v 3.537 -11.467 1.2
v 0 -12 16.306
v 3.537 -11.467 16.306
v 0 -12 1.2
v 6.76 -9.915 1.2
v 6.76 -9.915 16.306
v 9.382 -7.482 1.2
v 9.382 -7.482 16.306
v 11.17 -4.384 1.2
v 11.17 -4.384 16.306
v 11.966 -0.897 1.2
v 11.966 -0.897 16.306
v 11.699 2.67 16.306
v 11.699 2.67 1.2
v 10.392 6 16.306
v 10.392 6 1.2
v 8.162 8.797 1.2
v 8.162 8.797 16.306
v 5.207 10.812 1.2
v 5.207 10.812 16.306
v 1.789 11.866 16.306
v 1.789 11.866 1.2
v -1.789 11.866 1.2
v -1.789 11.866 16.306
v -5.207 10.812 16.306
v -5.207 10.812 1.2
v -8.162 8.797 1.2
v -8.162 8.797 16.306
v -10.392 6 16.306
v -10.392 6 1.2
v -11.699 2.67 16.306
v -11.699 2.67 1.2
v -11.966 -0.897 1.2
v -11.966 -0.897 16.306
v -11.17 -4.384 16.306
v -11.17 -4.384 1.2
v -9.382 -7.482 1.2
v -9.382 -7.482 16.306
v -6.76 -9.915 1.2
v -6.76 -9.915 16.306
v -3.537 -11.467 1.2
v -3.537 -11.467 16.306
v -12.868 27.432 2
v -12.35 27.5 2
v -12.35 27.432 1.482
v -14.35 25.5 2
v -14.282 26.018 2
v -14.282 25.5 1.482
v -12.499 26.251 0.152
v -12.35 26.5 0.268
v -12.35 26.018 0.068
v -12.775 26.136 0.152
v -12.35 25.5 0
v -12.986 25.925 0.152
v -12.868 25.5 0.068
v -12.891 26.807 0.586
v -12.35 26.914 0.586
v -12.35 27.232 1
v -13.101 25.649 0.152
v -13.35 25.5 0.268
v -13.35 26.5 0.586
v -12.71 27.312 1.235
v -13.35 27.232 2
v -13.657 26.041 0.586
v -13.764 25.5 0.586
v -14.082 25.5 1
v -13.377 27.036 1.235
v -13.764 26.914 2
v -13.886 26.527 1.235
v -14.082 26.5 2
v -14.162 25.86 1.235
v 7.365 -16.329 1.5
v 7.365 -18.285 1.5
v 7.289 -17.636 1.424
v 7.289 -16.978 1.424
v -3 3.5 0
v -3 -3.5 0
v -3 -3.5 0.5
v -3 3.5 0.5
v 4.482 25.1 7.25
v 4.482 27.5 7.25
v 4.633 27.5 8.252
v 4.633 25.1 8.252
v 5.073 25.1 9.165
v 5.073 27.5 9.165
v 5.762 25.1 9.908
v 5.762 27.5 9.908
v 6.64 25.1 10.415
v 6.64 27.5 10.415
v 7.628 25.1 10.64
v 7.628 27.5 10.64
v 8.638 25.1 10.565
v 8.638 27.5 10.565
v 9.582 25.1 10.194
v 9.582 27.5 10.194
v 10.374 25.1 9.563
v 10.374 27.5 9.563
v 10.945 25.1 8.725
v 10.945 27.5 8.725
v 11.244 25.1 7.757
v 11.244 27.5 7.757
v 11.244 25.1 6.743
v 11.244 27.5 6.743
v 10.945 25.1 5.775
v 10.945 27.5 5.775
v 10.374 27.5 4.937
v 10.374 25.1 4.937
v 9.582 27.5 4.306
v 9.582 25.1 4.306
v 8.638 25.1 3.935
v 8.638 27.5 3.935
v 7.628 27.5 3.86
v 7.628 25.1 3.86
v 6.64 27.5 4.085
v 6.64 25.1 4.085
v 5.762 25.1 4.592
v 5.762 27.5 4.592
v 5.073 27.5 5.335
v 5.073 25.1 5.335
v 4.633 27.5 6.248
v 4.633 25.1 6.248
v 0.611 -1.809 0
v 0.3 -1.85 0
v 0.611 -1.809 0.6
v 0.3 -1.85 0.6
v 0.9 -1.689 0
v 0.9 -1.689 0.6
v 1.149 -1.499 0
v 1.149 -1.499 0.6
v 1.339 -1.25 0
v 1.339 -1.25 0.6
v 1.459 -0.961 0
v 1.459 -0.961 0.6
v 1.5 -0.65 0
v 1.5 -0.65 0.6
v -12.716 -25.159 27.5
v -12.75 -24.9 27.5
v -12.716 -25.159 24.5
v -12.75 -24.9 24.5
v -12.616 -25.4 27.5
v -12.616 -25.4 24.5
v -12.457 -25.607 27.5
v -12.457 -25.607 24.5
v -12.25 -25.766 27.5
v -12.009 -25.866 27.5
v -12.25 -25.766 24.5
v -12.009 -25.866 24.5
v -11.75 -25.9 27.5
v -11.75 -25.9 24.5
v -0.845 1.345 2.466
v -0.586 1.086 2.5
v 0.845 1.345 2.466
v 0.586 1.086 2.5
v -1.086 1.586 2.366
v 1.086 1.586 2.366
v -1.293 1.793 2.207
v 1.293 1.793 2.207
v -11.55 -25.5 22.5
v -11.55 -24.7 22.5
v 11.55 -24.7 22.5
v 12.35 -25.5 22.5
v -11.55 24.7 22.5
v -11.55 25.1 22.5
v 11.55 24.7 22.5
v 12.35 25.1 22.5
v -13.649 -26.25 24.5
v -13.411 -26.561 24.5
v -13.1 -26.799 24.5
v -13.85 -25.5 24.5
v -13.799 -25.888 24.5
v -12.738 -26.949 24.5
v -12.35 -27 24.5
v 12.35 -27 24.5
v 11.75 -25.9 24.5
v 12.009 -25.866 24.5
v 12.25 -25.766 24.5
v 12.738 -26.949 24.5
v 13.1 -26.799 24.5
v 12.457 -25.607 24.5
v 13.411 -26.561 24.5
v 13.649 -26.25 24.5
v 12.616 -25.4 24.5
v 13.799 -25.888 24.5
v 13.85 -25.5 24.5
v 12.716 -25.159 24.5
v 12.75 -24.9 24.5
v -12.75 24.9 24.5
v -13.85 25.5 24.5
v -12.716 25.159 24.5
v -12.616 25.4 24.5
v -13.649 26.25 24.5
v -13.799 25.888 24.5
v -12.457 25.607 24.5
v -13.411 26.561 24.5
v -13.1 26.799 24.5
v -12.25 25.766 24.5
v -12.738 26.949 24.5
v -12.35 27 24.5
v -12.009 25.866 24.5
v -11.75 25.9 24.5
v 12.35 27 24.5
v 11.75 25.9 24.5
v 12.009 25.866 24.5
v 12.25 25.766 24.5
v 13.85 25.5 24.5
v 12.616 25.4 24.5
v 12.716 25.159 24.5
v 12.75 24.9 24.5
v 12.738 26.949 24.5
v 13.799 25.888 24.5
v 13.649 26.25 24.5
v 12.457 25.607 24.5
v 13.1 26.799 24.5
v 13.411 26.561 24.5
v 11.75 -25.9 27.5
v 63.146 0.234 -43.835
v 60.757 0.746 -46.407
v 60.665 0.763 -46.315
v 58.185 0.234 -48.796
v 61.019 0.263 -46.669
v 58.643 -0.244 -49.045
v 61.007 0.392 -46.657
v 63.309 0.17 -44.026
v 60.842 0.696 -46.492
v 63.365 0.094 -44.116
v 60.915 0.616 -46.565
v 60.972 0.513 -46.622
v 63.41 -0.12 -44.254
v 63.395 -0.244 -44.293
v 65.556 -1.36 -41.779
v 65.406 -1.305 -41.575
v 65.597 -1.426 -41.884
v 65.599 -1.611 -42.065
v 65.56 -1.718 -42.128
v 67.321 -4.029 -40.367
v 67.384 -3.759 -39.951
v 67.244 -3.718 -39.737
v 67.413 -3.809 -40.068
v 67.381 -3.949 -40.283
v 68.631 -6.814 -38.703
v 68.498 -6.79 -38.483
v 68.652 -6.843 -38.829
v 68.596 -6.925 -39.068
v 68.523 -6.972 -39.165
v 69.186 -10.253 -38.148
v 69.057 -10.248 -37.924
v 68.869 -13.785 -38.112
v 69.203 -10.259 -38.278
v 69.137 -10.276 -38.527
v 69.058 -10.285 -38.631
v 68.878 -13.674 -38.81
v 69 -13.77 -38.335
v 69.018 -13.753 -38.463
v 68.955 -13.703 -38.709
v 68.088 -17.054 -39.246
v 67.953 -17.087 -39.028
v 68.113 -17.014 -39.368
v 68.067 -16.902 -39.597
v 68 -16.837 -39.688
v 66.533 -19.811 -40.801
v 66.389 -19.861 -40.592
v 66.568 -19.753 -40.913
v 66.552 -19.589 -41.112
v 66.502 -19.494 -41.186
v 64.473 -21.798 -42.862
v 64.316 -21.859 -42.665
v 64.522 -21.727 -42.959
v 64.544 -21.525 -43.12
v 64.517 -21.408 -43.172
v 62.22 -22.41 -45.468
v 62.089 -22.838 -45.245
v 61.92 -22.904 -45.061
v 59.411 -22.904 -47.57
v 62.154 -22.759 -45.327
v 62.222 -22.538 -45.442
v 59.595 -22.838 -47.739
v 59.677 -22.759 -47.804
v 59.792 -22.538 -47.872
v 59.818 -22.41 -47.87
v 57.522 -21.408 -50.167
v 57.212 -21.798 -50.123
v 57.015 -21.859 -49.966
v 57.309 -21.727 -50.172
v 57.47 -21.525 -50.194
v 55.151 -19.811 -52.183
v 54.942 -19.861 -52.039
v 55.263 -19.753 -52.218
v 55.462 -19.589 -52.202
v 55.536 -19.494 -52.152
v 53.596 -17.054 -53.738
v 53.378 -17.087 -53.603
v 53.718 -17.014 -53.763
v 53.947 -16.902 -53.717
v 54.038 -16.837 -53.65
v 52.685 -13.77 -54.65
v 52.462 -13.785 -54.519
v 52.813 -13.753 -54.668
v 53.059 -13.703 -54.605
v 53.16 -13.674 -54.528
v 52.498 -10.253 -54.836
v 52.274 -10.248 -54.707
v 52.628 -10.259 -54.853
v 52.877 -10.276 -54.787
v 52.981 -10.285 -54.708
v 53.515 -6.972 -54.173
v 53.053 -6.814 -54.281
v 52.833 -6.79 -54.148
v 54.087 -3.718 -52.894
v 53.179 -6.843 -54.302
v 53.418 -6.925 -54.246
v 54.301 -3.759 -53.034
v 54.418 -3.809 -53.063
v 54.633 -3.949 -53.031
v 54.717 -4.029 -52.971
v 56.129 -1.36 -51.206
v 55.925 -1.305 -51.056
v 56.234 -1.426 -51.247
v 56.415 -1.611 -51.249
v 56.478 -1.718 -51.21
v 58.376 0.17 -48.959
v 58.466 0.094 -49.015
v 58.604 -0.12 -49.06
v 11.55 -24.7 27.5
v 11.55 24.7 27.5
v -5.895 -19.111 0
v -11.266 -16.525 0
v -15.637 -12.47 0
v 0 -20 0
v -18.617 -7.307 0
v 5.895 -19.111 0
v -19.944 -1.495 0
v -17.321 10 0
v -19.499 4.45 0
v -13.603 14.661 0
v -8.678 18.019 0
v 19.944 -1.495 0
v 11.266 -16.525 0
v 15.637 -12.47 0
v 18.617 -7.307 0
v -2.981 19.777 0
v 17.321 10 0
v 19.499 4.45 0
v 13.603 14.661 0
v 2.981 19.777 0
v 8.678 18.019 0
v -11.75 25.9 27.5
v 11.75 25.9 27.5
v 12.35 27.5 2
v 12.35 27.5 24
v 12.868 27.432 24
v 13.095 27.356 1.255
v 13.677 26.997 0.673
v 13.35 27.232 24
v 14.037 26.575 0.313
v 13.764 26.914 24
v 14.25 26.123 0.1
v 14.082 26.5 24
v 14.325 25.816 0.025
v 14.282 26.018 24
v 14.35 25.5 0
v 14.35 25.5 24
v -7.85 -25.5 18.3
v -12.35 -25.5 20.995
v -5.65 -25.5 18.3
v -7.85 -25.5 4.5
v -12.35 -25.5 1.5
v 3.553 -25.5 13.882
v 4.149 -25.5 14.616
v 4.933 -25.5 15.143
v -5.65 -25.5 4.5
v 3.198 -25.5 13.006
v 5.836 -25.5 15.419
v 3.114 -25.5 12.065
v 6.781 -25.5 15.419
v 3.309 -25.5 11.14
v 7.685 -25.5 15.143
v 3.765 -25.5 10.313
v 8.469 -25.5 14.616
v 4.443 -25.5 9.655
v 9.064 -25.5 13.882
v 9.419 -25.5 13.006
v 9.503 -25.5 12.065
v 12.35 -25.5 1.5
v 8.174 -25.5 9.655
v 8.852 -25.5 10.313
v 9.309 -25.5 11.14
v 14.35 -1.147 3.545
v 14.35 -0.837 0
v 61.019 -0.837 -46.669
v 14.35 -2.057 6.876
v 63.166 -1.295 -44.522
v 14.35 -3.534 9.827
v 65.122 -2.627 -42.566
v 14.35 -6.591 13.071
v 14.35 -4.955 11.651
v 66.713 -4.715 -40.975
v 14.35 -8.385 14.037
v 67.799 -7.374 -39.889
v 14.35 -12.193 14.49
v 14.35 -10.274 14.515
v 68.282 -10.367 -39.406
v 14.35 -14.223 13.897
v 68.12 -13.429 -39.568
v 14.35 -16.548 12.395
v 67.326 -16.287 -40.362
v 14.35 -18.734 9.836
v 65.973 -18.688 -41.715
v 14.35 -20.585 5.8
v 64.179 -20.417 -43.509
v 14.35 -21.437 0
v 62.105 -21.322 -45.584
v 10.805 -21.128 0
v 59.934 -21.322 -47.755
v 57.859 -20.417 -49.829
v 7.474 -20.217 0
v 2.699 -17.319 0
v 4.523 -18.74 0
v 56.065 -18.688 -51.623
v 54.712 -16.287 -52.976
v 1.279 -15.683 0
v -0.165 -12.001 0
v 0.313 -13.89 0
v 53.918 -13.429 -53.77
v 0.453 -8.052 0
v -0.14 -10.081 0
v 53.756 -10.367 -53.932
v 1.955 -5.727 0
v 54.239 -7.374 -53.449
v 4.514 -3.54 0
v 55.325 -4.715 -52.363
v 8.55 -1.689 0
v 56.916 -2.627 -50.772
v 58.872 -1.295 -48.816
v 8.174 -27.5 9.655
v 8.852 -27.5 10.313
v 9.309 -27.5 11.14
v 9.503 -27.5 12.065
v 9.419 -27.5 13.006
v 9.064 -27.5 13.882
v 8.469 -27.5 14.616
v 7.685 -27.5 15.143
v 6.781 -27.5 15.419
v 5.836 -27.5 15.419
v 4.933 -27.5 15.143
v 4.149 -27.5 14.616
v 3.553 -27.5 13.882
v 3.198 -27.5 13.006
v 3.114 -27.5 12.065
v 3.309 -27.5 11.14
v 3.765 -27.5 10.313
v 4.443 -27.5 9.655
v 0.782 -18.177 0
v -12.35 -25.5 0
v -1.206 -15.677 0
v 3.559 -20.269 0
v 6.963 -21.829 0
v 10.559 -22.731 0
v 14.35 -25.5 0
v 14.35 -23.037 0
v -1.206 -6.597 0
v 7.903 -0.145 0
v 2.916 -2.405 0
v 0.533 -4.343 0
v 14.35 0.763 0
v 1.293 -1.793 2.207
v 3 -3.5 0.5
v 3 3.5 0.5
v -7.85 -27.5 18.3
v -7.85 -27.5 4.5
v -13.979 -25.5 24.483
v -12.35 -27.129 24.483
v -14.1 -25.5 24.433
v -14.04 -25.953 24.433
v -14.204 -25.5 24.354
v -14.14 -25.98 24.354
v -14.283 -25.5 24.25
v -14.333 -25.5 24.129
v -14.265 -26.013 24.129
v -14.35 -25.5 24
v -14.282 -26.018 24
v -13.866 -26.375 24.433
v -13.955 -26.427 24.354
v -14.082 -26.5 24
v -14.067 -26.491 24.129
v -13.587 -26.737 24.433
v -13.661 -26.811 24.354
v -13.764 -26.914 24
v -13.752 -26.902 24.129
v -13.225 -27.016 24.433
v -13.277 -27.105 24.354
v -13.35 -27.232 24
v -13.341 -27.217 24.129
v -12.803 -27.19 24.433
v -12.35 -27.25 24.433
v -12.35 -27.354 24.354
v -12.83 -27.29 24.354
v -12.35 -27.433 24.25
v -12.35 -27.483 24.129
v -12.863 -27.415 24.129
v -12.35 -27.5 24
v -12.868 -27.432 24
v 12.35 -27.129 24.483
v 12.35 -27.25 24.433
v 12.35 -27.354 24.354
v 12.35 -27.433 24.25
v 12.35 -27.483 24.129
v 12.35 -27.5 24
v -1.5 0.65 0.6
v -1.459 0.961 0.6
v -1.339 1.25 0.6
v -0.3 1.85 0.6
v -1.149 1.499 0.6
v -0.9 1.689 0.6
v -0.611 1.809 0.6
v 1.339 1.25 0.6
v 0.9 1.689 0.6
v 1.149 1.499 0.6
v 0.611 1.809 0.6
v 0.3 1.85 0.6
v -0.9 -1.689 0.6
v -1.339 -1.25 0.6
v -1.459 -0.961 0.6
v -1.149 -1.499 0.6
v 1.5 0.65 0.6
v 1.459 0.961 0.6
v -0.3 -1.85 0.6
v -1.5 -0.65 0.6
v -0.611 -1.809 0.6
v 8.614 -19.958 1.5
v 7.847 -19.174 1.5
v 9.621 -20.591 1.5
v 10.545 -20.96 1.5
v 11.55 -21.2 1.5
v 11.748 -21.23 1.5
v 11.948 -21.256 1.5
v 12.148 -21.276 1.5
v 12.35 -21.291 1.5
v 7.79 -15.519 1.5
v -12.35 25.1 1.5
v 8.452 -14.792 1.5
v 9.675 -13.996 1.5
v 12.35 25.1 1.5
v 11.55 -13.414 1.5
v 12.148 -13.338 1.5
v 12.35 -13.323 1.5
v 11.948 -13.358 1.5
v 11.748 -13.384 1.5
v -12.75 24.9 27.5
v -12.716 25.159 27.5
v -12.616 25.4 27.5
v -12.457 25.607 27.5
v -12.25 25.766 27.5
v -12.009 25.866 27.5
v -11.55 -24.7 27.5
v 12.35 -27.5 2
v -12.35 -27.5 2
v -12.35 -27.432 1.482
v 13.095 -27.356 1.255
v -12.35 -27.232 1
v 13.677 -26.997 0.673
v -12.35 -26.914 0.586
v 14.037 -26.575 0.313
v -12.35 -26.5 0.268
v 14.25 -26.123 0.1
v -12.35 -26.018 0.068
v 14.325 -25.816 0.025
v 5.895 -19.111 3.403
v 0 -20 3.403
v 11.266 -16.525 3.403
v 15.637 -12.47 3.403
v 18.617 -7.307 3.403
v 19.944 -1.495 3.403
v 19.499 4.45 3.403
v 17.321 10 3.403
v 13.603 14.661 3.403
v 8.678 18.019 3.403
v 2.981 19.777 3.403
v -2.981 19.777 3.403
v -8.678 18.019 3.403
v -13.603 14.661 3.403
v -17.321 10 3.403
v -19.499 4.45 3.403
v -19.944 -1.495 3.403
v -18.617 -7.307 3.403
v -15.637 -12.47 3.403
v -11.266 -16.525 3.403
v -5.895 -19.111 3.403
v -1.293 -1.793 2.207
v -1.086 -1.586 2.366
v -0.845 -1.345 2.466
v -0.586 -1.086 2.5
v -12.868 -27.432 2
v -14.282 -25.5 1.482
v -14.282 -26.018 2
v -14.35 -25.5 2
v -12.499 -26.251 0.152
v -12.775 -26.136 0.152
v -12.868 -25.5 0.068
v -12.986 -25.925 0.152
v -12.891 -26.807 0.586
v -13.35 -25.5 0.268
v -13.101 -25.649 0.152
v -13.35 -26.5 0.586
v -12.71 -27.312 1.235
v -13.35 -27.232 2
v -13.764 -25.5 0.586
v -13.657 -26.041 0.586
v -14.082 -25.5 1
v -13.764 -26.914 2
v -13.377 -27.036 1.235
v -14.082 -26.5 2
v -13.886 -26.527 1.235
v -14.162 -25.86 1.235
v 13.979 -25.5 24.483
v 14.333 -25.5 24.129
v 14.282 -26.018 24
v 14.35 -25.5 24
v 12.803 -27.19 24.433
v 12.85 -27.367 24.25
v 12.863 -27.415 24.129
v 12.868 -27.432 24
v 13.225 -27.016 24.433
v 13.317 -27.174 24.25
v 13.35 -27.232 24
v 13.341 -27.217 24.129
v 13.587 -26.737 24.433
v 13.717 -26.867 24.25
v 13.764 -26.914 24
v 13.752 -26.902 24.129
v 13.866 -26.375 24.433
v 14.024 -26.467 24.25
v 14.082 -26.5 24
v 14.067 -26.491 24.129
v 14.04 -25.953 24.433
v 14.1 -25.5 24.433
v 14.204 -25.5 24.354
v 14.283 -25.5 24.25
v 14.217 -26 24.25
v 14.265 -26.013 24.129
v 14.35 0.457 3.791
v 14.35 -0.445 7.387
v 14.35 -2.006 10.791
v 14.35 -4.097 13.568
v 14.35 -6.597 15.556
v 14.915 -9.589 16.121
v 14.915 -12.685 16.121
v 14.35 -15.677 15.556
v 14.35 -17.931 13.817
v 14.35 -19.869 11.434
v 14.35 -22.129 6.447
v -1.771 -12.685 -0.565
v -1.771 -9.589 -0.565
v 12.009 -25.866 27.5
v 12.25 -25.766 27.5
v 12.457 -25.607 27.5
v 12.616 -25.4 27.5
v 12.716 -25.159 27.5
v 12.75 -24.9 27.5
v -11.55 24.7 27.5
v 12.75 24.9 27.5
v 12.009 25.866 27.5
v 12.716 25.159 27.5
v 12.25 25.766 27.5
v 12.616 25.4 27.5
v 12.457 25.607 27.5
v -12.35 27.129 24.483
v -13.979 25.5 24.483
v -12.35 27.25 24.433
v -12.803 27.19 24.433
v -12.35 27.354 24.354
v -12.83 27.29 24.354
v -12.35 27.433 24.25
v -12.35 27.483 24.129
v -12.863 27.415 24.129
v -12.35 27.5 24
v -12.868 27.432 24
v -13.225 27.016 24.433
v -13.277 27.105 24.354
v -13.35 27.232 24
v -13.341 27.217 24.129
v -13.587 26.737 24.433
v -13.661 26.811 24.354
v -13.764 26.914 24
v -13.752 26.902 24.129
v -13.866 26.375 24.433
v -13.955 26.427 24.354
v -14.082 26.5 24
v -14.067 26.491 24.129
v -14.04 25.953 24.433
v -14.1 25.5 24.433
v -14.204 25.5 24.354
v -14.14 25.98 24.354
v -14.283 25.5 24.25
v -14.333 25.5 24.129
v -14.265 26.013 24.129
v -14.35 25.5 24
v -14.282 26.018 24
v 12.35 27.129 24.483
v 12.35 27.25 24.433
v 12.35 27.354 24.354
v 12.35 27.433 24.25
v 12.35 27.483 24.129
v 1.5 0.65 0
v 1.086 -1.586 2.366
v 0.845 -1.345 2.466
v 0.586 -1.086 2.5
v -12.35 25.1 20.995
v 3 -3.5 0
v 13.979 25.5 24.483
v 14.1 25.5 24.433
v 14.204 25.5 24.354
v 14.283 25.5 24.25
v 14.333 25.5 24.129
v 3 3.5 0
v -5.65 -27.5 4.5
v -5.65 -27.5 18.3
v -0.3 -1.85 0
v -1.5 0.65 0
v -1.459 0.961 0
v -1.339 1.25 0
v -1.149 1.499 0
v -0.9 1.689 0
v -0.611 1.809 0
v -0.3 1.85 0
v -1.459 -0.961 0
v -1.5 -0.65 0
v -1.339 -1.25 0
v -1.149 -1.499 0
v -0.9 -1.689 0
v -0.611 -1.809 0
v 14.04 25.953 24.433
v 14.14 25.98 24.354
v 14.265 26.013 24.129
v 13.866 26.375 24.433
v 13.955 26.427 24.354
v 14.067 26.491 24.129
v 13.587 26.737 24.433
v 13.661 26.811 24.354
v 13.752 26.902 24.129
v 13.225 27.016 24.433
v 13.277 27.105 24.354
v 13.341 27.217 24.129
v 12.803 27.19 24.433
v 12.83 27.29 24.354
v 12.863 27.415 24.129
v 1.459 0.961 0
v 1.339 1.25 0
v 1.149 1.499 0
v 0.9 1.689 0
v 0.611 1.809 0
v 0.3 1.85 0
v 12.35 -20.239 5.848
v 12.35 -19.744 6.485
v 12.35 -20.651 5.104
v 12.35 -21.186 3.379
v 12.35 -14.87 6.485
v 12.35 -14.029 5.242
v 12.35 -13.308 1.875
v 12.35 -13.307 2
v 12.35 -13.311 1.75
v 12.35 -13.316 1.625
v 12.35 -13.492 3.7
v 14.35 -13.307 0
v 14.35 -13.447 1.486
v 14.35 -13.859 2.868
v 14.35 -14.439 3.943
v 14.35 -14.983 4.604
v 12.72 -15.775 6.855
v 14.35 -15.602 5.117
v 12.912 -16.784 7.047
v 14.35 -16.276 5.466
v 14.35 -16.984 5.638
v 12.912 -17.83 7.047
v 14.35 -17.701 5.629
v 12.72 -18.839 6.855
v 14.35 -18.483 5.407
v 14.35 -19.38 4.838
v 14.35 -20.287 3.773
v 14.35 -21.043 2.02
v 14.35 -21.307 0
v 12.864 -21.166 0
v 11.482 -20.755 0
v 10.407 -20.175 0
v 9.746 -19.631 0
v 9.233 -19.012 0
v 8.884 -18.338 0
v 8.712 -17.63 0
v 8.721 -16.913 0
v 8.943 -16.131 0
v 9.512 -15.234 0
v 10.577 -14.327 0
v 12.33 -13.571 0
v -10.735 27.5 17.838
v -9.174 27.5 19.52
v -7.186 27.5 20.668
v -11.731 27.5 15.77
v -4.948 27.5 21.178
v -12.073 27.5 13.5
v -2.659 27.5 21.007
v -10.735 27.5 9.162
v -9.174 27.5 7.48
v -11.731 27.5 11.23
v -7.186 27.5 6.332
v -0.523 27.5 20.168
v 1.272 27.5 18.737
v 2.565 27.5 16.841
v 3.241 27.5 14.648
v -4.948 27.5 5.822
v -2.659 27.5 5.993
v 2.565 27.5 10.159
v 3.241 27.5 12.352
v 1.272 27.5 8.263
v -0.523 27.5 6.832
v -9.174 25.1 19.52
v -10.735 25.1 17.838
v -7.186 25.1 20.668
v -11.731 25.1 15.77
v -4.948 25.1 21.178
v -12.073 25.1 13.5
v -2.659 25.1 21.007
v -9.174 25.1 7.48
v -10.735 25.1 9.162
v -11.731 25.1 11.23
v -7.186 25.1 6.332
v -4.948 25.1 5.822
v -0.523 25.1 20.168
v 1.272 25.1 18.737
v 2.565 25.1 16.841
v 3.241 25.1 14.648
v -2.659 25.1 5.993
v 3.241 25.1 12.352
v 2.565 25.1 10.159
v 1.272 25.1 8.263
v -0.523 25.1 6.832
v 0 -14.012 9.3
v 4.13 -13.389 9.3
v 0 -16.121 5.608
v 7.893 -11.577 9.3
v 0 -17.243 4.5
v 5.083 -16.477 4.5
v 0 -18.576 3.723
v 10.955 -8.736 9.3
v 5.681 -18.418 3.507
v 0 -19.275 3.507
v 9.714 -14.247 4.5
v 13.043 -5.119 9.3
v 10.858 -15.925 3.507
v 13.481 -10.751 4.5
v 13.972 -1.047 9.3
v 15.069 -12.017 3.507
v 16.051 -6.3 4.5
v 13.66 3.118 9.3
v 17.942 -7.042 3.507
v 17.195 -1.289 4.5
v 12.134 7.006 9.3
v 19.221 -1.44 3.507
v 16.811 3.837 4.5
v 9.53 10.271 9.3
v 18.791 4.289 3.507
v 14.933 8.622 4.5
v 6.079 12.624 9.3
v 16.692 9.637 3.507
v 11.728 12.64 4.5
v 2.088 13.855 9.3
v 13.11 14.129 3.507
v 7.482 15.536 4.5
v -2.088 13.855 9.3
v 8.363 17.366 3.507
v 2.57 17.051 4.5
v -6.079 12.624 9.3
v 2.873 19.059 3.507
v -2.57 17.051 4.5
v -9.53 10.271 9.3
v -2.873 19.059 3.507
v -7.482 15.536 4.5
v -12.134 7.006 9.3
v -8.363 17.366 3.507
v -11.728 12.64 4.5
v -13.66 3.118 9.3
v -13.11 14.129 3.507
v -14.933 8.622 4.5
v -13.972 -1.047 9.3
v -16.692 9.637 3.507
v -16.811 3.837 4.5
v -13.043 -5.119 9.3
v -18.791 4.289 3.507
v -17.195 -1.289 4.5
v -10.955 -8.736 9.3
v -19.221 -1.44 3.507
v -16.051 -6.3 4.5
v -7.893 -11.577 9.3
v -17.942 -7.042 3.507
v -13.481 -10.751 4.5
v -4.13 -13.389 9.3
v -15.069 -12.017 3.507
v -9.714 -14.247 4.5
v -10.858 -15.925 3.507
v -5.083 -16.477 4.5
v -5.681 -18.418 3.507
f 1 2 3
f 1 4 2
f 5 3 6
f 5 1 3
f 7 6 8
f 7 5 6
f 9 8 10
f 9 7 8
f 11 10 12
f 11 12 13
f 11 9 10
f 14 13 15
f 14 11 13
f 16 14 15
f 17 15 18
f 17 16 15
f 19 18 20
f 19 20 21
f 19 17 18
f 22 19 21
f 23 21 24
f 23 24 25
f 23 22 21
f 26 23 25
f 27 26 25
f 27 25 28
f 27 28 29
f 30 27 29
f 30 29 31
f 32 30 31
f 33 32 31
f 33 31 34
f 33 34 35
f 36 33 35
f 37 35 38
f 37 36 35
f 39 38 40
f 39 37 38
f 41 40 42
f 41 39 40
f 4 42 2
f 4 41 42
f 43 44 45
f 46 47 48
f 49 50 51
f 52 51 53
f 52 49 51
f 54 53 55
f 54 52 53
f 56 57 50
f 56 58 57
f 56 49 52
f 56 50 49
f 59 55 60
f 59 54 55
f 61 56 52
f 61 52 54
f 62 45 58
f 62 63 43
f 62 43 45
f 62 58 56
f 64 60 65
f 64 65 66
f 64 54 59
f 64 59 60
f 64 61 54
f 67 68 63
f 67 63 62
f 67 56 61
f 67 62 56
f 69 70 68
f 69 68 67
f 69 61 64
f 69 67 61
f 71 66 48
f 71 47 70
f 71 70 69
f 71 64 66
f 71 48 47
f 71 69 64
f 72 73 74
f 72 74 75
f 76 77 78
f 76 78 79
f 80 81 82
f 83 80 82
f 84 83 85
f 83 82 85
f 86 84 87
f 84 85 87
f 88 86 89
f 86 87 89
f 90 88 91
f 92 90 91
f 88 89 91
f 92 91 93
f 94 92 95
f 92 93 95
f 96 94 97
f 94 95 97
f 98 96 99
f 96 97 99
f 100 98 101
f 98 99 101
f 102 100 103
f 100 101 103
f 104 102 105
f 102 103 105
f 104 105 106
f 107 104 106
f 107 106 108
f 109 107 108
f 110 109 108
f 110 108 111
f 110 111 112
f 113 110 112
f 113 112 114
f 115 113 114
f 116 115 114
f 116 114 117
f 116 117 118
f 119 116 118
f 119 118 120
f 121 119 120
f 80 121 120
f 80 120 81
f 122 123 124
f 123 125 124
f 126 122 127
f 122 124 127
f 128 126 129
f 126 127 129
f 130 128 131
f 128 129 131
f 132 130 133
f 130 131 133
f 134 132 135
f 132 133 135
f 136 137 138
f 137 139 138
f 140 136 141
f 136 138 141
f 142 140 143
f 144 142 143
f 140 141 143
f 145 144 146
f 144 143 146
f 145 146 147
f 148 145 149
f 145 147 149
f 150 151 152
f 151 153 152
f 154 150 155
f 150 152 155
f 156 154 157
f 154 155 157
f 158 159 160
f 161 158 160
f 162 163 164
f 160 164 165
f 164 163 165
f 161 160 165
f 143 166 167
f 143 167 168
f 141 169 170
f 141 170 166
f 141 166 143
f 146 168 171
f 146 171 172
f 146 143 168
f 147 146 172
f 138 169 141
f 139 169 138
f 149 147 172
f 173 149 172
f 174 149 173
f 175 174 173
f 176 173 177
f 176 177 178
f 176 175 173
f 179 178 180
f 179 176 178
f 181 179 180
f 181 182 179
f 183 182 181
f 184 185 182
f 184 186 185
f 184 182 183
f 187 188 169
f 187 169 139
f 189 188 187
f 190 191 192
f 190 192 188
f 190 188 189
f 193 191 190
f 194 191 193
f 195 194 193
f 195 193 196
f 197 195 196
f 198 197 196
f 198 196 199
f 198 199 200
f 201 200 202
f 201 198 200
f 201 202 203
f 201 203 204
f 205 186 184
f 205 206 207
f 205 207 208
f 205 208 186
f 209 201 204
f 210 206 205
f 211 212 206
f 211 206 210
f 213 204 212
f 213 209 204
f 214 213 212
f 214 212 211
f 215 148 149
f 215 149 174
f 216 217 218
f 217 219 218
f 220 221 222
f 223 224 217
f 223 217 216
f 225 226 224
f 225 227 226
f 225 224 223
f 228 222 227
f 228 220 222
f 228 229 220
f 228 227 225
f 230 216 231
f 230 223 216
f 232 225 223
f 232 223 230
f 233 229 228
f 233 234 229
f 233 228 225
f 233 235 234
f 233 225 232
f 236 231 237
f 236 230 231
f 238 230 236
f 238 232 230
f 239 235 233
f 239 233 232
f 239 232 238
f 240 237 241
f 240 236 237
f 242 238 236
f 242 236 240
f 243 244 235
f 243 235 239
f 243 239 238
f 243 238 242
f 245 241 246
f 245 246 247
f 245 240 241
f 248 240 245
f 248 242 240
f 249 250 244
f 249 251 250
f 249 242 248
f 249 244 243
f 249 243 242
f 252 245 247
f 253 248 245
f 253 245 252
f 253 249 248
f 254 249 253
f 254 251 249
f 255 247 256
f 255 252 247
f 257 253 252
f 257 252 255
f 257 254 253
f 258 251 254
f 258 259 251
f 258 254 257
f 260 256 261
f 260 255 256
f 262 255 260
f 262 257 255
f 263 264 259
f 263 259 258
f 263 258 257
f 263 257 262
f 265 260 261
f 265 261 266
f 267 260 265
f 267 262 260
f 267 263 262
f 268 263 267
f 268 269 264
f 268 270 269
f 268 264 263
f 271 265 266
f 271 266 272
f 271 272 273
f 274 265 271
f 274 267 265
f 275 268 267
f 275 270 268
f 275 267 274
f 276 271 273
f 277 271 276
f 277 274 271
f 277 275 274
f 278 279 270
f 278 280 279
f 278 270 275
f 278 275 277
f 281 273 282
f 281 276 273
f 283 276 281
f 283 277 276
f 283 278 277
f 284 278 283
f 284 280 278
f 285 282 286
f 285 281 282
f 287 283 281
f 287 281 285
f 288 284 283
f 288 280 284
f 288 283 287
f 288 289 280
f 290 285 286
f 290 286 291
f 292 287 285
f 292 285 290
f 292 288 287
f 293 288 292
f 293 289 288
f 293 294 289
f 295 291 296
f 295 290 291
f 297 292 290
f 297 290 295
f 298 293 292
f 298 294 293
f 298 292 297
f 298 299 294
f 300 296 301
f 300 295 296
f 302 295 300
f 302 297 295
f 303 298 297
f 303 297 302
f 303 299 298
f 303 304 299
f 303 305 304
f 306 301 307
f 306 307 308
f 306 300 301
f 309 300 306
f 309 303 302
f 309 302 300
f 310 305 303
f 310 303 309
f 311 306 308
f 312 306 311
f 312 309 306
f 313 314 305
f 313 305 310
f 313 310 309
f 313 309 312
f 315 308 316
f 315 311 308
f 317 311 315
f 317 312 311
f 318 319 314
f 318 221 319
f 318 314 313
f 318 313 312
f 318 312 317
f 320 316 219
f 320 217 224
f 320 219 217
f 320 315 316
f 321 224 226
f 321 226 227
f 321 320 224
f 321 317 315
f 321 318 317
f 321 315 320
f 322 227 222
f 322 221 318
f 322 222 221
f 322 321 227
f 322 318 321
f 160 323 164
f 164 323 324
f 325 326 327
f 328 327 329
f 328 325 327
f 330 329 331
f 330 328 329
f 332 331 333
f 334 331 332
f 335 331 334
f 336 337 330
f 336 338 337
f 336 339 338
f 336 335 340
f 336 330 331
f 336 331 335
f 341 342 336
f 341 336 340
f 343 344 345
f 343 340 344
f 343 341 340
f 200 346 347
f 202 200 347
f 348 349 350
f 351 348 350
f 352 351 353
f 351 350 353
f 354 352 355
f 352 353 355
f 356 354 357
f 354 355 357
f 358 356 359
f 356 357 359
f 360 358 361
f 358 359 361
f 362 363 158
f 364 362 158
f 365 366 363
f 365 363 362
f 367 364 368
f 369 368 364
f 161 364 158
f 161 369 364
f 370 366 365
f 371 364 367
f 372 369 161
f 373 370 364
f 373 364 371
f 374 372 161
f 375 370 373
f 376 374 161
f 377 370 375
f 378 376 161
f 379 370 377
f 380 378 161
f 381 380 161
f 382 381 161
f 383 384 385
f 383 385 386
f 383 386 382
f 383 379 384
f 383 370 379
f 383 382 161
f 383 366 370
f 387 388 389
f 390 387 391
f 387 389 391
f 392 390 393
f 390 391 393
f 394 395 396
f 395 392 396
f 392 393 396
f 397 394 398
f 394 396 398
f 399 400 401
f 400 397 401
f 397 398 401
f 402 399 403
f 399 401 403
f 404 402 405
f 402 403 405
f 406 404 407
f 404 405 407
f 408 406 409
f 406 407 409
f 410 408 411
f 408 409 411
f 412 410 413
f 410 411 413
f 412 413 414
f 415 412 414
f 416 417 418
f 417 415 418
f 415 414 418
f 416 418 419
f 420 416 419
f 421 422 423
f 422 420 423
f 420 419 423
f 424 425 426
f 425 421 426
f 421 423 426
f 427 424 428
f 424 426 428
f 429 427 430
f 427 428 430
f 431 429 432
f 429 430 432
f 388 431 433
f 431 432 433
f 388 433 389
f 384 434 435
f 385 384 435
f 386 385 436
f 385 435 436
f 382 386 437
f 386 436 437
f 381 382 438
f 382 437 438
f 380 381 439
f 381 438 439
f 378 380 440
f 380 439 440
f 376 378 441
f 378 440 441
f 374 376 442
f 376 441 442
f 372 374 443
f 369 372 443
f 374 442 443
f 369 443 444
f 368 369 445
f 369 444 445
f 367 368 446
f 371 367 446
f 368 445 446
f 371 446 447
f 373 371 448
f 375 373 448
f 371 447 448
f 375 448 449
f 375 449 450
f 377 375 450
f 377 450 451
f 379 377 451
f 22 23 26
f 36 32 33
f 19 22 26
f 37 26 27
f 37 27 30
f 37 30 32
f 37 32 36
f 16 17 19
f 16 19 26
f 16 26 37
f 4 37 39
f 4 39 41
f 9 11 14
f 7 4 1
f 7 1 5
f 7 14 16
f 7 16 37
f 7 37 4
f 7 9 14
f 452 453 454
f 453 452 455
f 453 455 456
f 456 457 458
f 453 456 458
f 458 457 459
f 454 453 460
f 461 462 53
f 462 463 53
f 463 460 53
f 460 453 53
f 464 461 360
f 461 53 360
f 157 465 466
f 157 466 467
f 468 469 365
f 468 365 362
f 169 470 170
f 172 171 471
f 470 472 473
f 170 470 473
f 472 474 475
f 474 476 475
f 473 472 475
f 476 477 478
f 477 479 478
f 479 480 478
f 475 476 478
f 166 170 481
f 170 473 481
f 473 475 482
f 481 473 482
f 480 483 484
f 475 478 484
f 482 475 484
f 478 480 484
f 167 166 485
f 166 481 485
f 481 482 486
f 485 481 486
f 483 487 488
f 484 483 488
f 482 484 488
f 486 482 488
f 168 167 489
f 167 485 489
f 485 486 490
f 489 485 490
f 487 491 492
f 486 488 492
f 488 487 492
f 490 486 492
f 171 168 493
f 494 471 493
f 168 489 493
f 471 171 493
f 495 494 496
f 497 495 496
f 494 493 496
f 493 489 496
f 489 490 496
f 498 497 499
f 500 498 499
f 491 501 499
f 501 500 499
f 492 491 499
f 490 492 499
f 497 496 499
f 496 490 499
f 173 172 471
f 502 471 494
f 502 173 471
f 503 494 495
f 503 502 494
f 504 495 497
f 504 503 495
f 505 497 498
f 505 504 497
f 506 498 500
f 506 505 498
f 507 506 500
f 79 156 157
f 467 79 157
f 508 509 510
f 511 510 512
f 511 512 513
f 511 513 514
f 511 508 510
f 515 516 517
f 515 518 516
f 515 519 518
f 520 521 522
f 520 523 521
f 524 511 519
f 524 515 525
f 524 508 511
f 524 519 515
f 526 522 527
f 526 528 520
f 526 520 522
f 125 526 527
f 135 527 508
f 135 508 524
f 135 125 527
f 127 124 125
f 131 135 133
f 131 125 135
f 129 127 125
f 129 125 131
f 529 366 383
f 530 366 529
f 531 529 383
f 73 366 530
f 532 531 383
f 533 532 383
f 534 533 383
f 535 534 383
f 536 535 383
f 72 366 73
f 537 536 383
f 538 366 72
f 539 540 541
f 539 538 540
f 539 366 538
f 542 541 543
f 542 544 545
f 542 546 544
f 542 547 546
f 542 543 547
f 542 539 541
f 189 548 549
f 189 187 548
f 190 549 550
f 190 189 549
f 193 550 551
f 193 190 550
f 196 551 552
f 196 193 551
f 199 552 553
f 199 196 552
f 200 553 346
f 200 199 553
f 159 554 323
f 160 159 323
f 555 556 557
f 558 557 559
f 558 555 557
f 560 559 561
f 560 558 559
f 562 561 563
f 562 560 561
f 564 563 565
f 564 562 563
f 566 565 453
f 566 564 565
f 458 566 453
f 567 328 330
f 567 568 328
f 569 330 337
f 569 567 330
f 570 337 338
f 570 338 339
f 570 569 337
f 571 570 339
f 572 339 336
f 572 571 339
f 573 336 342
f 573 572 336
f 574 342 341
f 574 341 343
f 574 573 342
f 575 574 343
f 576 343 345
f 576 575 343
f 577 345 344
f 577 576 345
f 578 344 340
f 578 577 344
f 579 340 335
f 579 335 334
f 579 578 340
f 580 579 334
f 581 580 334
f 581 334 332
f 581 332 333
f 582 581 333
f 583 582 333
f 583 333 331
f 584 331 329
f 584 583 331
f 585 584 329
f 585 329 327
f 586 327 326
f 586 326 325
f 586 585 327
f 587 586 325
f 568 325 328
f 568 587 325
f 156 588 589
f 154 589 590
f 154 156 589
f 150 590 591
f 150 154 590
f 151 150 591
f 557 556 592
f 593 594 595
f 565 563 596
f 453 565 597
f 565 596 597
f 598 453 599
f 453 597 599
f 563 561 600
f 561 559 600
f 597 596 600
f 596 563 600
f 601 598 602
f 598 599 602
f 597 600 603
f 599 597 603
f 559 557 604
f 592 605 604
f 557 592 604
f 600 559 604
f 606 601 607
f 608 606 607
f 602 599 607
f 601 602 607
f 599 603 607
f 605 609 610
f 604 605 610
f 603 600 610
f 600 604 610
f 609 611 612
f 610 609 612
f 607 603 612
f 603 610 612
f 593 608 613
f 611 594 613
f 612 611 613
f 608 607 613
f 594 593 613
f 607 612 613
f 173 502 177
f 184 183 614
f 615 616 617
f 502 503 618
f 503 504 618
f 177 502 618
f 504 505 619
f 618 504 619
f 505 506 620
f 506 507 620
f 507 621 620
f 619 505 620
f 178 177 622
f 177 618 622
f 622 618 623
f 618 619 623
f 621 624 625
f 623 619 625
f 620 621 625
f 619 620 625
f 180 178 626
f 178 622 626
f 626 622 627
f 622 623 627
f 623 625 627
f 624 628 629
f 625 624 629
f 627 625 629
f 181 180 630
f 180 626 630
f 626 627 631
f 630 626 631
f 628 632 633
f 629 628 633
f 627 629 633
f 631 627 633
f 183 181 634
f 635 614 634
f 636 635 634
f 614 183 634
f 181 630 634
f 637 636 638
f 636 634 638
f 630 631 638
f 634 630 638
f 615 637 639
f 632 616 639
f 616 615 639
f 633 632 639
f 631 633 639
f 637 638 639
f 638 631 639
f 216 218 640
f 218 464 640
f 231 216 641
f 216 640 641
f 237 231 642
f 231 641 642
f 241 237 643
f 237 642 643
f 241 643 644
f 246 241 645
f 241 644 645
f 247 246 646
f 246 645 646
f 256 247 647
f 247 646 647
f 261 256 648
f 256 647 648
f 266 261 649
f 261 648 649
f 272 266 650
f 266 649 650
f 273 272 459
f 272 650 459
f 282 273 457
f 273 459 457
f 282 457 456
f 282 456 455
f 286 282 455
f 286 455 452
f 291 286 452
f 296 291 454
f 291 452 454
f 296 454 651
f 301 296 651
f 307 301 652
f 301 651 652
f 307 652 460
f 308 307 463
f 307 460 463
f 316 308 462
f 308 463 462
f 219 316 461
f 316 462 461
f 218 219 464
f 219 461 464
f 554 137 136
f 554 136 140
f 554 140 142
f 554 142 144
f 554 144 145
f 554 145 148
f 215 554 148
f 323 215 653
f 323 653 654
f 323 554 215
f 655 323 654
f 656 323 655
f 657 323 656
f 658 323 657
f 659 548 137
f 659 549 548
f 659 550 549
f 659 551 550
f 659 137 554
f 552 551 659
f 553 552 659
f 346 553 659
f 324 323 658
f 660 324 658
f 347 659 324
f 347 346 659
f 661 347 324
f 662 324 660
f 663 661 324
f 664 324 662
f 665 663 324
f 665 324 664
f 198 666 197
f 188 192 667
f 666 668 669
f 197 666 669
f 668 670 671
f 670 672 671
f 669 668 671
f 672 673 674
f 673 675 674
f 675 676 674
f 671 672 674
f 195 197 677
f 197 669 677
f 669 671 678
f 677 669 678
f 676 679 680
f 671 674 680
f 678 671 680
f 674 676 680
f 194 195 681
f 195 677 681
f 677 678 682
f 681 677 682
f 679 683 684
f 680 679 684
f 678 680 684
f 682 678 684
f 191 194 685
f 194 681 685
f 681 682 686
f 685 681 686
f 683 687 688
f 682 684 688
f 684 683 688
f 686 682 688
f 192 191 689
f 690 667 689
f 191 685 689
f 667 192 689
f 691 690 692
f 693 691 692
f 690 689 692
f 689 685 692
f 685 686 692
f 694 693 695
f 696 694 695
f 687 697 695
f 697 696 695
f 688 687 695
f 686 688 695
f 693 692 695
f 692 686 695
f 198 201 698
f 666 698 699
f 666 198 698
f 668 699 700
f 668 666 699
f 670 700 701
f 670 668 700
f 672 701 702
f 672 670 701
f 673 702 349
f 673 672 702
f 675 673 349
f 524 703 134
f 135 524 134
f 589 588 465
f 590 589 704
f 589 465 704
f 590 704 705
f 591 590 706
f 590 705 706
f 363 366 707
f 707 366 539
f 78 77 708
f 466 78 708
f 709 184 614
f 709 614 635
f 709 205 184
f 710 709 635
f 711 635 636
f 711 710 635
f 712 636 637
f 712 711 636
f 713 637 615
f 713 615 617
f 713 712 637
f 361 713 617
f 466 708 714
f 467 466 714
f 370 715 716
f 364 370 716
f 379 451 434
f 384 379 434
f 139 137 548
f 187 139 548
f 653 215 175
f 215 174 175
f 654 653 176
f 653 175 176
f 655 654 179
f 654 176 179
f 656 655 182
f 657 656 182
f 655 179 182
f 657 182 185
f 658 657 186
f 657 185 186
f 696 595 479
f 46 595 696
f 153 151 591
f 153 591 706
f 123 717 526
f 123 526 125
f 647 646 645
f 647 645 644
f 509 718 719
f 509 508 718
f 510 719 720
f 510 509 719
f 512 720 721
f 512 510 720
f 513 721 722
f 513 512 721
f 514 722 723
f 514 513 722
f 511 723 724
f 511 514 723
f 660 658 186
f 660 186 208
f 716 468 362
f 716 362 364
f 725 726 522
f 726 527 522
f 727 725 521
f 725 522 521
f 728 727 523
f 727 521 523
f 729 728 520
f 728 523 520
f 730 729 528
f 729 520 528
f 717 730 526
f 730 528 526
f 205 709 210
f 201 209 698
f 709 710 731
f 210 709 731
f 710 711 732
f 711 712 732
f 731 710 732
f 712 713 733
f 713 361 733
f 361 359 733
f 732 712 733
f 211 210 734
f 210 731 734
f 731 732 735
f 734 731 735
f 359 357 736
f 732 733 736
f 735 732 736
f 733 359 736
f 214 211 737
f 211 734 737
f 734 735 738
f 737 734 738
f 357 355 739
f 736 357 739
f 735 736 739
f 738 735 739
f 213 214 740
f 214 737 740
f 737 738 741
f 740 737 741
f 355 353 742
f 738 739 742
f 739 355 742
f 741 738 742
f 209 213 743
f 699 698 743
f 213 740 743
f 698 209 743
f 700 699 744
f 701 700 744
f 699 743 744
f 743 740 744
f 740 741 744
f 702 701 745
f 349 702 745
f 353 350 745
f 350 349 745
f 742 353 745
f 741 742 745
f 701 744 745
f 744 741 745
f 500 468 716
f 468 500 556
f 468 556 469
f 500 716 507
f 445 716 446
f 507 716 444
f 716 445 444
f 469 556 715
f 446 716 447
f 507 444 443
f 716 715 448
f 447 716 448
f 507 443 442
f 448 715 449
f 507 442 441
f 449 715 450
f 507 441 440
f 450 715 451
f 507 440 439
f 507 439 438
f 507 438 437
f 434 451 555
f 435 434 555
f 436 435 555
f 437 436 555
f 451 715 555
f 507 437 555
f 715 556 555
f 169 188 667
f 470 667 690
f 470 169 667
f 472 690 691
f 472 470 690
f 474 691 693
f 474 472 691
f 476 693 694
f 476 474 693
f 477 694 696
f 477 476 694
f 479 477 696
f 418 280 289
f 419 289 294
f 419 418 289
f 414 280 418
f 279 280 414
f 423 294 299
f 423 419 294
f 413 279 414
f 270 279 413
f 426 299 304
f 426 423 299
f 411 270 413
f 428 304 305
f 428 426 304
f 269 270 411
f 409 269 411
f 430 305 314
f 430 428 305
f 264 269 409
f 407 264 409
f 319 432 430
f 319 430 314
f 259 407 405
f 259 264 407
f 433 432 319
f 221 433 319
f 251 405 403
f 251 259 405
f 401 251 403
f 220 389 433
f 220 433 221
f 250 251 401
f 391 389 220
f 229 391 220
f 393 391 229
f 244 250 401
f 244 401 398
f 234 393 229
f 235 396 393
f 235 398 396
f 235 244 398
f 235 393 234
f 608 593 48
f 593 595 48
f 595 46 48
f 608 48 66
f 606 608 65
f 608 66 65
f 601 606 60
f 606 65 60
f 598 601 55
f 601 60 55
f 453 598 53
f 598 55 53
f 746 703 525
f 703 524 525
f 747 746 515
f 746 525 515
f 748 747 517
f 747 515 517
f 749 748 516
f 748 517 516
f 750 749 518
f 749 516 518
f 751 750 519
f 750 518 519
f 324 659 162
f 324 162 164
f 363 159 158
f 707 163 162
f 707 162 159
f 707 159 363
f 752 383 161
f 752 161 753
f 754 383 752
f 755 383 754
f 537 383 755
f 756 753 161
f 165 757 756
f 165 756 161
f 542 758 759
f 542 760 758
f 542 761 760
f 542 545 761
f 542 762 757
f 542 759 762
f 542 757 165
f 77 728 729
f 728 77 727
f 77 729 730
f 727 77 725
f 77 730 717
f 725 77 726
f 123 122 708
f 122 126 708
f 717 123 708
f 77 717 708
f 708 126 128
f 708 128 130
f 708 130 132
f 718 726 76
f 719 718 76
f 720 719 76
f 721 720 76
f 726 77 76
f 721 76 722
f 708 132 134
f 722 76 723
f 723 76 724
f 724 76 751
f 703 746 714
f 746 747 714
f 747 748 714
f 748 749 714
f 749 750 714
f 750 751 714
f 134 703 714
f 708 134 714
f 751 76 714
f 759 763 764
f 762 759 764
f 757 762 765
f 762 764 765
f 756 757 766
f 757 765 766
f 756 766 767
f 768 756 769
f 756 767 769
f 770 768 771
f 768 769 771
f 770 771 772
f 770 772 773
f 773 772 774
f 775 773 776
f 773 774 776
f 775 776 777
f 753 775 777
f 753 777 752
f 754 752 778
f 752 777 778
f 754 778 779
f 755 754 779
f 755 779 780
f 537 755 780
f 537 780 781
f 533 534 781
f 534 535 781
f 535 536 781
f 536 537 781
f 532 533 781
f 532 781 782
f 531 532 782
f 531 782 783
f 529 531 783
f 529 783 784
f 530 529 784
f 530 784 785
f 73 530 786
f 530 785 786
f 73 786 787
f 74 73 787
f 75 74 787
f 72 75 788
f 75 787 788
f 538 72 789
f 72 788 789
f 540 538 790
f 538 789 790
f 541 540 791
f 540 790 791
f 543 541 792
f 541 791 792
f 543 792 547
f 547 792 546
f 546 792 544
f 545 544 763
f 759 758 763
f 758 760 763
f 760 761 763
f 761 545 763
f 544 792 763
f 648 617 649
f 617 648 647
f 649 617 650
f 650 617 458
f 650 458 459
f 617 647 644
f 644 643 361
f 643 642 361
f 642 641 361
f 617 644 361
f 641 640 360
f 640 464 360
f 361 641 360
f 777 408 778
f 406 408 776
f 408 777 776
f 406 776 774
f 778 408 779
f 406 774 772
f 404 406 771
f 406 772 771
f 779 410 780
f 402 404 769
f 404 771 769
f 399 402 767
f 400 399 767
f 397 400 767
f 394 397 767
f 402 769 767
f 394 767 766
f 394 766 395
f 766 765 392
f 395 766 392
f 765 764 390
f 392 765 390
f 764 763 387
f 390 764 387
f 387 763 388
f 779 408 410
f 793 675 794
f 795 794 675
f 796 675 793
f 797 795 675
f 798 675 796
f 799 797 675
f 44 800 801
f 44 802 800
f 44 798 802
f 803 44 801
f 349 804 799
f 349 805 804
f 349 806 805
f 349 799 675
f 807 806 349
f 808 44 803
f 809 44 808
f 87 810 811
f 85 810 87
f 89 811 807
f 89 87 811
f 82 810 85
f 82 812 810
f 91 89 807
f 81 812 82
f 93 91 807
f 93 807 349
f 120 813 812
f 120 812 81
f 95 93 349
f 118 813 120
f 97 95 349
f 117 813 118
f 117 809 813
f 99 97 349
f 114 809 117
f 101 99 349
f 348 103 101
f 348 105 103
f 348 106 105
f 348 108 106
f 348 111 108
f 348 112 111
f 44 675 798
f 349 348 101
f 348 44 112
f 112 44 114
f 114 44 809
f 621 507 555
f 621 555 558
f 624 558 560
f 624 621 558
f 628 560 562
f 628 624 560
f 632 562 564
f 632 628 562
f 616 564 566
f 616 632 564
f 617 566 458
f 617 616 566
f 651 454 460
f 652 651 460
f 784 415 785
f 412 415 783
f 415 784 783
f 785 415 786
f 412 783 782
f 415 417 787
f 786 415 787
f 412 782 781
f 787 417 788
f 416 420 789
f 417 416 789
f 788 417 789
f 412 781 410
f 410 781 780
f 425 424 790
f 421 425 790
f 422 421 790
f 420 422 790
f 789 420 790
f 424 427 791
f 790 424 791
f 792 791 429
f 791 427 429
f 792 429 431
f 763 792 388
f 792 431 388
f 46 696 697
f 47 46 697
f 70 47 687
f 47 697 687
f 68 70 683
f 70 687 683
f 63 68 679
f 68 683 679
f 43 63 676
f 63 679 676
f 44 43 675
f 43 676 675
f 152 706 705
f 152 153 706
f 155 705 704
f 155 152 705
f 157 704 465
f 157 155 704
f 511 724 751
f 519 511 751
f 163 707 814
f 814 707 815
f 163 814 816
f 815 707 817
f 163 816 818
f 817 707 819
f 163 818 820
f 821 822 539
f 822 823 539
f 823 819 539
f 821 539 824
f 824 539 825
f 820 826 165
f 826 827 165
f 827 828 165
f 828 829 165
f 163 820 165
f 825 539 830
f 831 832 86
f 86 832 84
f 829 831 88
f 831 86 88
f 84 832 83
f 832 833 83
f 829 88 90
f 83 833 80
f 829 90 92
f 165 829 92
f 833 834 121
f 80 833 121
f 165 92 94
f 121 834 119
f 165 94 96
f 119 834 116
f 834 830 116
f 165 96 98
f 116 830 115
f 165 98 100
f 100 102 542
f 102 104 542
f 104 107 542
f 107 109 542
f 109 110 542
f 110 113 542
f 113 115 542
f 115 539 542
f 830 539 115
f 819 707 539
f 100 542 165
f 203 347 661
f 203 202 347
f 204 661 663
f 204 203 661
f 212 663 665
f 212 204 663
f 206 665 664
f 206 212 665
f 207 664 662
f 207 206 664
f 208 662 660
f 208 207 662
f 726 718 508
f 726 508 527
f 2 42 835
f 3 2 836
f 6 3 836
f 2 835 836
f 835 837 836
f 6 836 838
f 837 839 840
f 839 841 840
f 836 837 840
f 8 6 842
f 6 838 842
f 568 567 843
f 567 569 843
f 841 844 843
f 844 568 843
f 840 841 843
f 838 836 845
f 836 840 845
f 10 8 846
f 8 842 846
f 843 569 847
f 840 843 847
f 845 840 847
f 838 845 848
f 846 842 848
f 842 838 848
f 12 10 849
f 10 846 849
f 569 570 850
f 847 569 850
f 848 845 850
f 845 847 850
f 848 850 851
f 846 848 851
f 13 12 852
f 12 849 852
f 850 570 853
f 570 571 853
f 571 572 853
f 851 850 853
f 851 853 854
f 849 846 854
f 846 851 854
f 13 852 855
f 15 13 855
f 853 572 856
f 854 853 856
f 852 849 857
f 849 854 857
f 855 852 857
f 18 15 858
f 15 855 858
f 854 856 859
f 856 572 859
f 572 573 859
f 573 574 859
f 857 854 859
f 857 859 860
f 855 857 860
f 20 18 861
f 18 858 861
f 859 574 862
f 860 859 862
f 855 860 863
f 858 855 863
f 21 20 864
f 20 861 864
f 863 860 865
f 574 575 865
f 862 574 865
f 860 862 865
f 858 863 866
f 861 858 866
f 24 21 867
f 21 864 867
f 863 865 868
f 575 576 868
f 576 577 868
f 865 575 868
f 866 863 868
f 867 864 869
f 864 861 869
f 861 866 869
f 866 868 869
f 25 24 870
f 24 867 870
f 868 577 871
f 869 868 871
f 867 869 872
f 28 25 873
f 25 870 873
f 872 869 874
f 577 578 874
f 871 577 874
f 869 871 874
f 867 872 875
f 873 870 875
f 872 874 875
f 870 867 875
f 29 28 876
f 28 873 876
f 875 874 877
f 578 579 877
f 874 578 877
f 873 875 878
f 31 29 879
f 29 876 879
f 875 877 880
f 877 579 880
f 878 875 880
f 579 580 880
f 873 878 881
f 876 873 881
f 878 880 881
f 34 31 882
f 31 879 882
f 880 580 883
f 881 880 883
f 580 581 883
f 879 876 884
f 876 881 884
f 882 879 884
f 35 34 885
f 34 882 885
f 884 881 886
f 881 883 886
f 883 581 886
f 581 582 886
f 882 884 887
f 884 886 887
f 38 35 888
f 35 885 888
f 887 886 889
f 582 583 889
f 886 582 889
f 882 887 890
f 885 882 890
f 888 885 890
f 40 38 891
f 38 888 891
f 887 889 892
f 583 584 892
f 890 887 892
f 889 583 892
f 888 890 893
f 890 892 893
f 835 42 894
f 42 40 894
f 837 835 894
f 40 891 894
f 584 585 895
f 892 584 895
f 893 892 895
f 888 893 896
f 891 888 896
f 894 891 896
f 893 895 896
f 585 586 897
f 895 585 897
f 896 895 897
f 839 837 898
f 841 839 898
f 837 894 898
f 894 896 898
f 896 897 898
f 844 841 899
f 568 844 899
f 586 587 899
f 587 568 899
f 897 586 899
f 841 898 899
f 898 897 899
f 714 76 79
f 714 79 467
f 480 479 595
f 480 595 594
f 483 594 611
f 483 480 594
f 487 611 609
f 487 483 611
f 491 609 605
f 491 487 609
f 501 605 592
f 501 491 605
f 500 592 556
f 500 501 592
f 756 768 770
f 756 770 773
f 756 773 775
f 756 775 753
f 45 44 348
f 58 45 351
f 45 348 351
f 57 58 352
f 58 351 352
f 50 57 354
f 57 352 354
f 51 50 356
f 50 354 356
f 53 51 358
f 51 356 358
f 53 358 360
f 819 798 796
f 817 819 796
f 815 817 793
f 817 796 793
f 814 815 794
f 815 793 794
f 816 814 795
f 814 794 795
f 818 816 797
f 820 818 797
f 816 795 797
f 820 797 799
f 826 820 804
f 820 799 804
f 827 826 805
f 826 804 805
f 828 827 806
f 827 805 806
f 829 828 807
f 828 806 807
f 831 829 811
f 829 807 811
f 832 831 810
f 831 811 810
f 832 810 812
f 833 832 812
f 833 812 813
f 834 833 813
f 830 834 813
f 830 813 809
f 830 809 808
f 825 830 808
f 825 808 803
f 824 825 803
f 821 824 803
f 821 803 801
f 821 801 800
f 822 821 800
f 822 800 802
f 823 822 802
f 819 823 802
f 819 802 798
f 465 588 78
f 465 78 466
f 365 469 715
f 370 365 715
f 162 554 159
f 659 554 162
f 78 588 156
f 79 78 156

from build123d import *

# Parameters (mm, degrees)
SKETCH_W          = 28.7
SKETCH_H          = 55
PAD_DEPTH         = 27.5
SKETCH001_W       = 28.7
SKETCH001_H       = 55
SKETCH001_W_2     = 25.5
SKETCH001_H_2     = 51.8
POCKET_DEPTH      = 3
SKETCH002_W       = 23.1
SKETCH002_H       = 49.4
POCKET001_DEPTH   = 26
SKETCH003_R       = 3.4
POCKET002_DEPTH   = 5
SKETCH007_W       = 2.2
SKETCH007_H       = 13.8
POCKET005_DEPTH   = 2
SKETCH008_R       = 7.7
POCKET006_DEPTH   = 3
SKETCH009_R       = 11.9
SKETCH009_R_2     = 10.3
PAD002_DEPTH      = 66
PAD002_DEPTH_BACK = 11
POCKET008_DEPTH   = 2.8
SKETCH014_R       = 4
POCKET010_DEPTH   = 6
SKETCH004_W       = 24.7
SKETCH004_H       = 50.6
POCKET011_DEPTH   = 21
PAD003_DEPTH      = 50.6
FILLET_R          = 1
FILLET005_R       = 2
FILLET006_R       = 0.5
FILLET007_R       = 0.5
SKETCH005_W       = 6
SKETCH005_H       = 7
PAD001_DEPTH      = 2.5
CHAMFER001_SIZE   = 2
FILLET003_R       = 1
SKETCH006_W       = 3
SKETCH006_H       = 3.7
POCKET004_DEPTH   = 0.6
FILLET004_R       = 1.2


with BuildPart() as body:
    # Sketch → Pad (new body)
    with BuildSketch(Plane.XY):
        Rectangle(SKETCH_W, SKETCH_H)
    extrude(amount=PAD_DEPTH)

    # Sketch001 (on Face6 of Pad) → Pocket (cut)
    with BuildSketch(Plane.XY.offset(27.5)):
        Rectangle(SKETCH001_W, SKETCH001_H)
        Rectangle(SKETCH001_W_2, SKETCH001_H_2, mode=Mode.SUBTRACT)
    extrude(amount=-POCKET_DEPTH, mode=Mode.SUBTRACT)

    # Sketch002 (on Face11 of Pocket) → Pocket001 (cut)
    with BuildSketch(Plane.XY.offset(27.5)):
        Rectangle(SKETCH002_W, SKETCH002_H)
    extrude(amount=-POCKET001_DEPTH, mode=Mode.SUBTRACT)

    # Sketch003 → Pocket002 (cut)
    with BuildSketch(Plane(origin=(0, 27.5, 0), x_dir=(-1, 0, 0), z_dir=(0, 1, 0))):
        with Locations((-7.881901, 7.25)):
            Circle(SKETCH003_R)
    extrude(amount=-POCKET002_DEPTH, mode=Mode.SUBTRACT)

    # Sketch007 → Pocket005 (cut)
    with BuildSketch(Plane.XZ.offset(27.5)):
        with Locations((-6.75, 11.4)):
            Rectangle(SKETCH007_W, SKETCH007_H)
    extrude(amount=-POCKET005_DEPTH, mode=Mode.SUBTRACT)

    # Sketch008 (on Face1 of Pocket005) → Pocket006 (cut)
    with BuildSketch(Plane(origin=(0, 27.5, 0), x_dir=(-1, 0, 0), z_dir=(0, 1, 0))):
        with Locations((4.372906, 13.5)):
            Circle(SKETCH008_R)
    extrude(amount=-POCKET006_DEPTH, mode=Mode.SUBTRACT)

    # Sketch009 (on DatumPlane) → Pad002 (join, two sides)
    with BuildSketch(Plane(origin=(14.35, 0, 0), x_dir=(0, 1, 0), z_dir=(0.707107, 0, -0.707107))) as pad002_sk:
        with Locations((-11.137205, 0)):
            Circle(SKETCH009_R)
        with Locations((-11.137205, 0)):
            Circle(SKETCH009_R_2, mode=Mode.SUBTRACT)
    extrude(amount=PAD002_DEPTH)
    extrude(pad002_sk.sketch, amount=-PAD002_DEPTH_BACK)

    # Sketch011 → Pocket008 (cut)
    with BuildSketch(Plane.XZ.offset(27.5)):
        with BuildLine():
            ThreePointArc((8.174312, 9.654509), (6.308836, 15.454509), (4.44336, 9.654509))
            Line((4.44336, 9.654509), (8.174312, 9.654509))
        make_face()
    extrude(amount=-POCKET008_DEPTH, mode=Mode.SUBTRACT)

    # Sketch014 (on DatumPlane) → Pocket010 (cut)
    with BuildSketch(Plane(origin=(14.35, 0, 0), x_dir=(0, 1, 0), z_dir=(0.707107, 0, -0.707107))):
        with Locations((-17.30696, 0)):
            Circle(SKETCH014_R)
    extrude(amount=-POCKET010_DEPTH, mode=Mode.SUBTRACT)

    # Sketch004 (on Face27 of Pocket010) → Pocket011 (cut)
    with BuildSketch(Plane.XY.offset(1.5)):
        with Locations((0, -0.2)):
            Rectangle(SKETCH004_W, SKETCH004_H)
    extrude(amount=POCKET011_DEPTH, mode=Mode.SUBTRACT)

    # Sketch015 (on Face16 of Pocket011) → Pad003 (join)
    with BuildSketch(Plane.XZ.offset(-25.1)):
        Polygon((-12.35, 22.5), (-11.55, 22.5), (-12.35, 20.995398), align=None)
    extrude(amount=PAD003_DEPTH)

    # Fillet
    fillet_edges = [body.edges().sort_by_distance(p)[0] for p in [
        (12.75, -25.9, 26),
        (12.75, 25.9, 26),
        (-12.75, -25.9, 26),
        (-12.75, 25.9, 26),
    ]]
    fillet(fillet_edges, radius=FILLET_R)

    # Fillet005
    fillet005_edges = [body.edges().sort_by_distance(p)[0] for p in [
        (-14.35, 27.5, 12.25),
        (-14.35, -27.5, 12.25),
        (14.35, -27.5, 12.25),
        (14.35, 27.5, 12.25),
        (0, 27.5, 0),
        (0, -27.5, 0),
        (-14.35, 0, 0),
    ]]
    fillet(fillet005_edges, radius=FILLET005_R)

    # Fillet006
    fillet006_edges = [body.edges().sort_by_distance(p)[0] for p in [
        (14.35, 0, 24.5),
        (13.764214, -26.914214, 24.5),
        (0, -27.5, 24.5),
        (13.764214, 26.914214, 24.5),
        (0, 27.5, 24.5),
        (-13.764214, 26.914214, 24.5),
        (-14.35, 0, 24.5),
        (-13.764214, -26.914214, 24.5),
    ]]
    fillet(fillet006_edges, radius=FILLET006_R)

    # Fillet007
    fillet007_edges = [body.edges().sort_by_distance(p)[0] for p in [
        (61.019048, -23.037205, -46.669048),
    ]]
    fillet(fillet007_edges, radius=FILLET007_R)


with BuildPart() as button:
    # Sketch005 → Pad001 (new body)
    with BuildSketch(Plane.XY):
        Rectangle(SKETCH005_W, SKETCH005_H)
    extrude(amount=PAD001_DEPTH)

    # Chamfer001
    chamfer001_edges = [button.edges().sort_by_distance(p)[0] for p in [
        (0, 3.5, 2.5),
        (3, 0, 2.5),
        (0, -3.5, 2.5),
        (-3, 0, 2.5),
    ]]
    chamfer(chamfer001_edges, length=CHAMFER001_SIZE)

    # Fillet003
    fillet003_edges = [button.edges().sort_by_distance(p)[0] for p in [
        (0, 1.5, 2.5),
        (-1, 0, 2.5),
        (1, 0, 2.5),
        (0, -1.5, 2.5),
    ]]
    fillet(fillet003_edges, radius=FILLET003_R)

    # Sketch006 (on Face11 of Fillet003) → Pocket004 (cut)
    with BuildSketch(Plane(origin=(0, 0, 0), x_dir=(1, 0, 0), z_dir=(0, 0, -1))):
        Rectangle(SKETCH006_W, SKETCH006_H)
    extrude(amount=-POCKET004_DEPTH, mode=Mode.SUBTRACT)

    # Fillet004
    fillet004_edges = [button.edges().sort_by_distance(p)[0] for p in [
        (-1.5, -1.85, 0.3),
        (1.5, -1.85, 0.3),
        (1.5, 1.85, 0.3),
        (-1.5, 1.85, 0.3),
    ]]
    fillet(fillet004_edges, radius=FILLET004_R)


with BuildPart() as bat_cap:
    # Sketch012 → Revolution (revolve)
    with BuildSketch(Plane.YZ):
        with BuildLine():
            Line((-12, 16.3058), (-12, 1.2))
            Line((-12, 1.2), (0, 1.2))
            Line((0, 1.2), (0, 0))
            Line((0, 0), (-20, 0))
            Line((-20, 0), (-20, 3.402748))
            add(Edge.make_bspline(
                [(-12, 16.3058), (-14.526023, 3.768002), (-20, 3.402748)],
                knots=[0, 0, 0, 1, 1, 1], degree=2))
        make_face()
    revolve(axis=Axis((0, 0, 0), (0, 0, 1)))


solid = Compound([body.part, button.part, bat_cap.part])
